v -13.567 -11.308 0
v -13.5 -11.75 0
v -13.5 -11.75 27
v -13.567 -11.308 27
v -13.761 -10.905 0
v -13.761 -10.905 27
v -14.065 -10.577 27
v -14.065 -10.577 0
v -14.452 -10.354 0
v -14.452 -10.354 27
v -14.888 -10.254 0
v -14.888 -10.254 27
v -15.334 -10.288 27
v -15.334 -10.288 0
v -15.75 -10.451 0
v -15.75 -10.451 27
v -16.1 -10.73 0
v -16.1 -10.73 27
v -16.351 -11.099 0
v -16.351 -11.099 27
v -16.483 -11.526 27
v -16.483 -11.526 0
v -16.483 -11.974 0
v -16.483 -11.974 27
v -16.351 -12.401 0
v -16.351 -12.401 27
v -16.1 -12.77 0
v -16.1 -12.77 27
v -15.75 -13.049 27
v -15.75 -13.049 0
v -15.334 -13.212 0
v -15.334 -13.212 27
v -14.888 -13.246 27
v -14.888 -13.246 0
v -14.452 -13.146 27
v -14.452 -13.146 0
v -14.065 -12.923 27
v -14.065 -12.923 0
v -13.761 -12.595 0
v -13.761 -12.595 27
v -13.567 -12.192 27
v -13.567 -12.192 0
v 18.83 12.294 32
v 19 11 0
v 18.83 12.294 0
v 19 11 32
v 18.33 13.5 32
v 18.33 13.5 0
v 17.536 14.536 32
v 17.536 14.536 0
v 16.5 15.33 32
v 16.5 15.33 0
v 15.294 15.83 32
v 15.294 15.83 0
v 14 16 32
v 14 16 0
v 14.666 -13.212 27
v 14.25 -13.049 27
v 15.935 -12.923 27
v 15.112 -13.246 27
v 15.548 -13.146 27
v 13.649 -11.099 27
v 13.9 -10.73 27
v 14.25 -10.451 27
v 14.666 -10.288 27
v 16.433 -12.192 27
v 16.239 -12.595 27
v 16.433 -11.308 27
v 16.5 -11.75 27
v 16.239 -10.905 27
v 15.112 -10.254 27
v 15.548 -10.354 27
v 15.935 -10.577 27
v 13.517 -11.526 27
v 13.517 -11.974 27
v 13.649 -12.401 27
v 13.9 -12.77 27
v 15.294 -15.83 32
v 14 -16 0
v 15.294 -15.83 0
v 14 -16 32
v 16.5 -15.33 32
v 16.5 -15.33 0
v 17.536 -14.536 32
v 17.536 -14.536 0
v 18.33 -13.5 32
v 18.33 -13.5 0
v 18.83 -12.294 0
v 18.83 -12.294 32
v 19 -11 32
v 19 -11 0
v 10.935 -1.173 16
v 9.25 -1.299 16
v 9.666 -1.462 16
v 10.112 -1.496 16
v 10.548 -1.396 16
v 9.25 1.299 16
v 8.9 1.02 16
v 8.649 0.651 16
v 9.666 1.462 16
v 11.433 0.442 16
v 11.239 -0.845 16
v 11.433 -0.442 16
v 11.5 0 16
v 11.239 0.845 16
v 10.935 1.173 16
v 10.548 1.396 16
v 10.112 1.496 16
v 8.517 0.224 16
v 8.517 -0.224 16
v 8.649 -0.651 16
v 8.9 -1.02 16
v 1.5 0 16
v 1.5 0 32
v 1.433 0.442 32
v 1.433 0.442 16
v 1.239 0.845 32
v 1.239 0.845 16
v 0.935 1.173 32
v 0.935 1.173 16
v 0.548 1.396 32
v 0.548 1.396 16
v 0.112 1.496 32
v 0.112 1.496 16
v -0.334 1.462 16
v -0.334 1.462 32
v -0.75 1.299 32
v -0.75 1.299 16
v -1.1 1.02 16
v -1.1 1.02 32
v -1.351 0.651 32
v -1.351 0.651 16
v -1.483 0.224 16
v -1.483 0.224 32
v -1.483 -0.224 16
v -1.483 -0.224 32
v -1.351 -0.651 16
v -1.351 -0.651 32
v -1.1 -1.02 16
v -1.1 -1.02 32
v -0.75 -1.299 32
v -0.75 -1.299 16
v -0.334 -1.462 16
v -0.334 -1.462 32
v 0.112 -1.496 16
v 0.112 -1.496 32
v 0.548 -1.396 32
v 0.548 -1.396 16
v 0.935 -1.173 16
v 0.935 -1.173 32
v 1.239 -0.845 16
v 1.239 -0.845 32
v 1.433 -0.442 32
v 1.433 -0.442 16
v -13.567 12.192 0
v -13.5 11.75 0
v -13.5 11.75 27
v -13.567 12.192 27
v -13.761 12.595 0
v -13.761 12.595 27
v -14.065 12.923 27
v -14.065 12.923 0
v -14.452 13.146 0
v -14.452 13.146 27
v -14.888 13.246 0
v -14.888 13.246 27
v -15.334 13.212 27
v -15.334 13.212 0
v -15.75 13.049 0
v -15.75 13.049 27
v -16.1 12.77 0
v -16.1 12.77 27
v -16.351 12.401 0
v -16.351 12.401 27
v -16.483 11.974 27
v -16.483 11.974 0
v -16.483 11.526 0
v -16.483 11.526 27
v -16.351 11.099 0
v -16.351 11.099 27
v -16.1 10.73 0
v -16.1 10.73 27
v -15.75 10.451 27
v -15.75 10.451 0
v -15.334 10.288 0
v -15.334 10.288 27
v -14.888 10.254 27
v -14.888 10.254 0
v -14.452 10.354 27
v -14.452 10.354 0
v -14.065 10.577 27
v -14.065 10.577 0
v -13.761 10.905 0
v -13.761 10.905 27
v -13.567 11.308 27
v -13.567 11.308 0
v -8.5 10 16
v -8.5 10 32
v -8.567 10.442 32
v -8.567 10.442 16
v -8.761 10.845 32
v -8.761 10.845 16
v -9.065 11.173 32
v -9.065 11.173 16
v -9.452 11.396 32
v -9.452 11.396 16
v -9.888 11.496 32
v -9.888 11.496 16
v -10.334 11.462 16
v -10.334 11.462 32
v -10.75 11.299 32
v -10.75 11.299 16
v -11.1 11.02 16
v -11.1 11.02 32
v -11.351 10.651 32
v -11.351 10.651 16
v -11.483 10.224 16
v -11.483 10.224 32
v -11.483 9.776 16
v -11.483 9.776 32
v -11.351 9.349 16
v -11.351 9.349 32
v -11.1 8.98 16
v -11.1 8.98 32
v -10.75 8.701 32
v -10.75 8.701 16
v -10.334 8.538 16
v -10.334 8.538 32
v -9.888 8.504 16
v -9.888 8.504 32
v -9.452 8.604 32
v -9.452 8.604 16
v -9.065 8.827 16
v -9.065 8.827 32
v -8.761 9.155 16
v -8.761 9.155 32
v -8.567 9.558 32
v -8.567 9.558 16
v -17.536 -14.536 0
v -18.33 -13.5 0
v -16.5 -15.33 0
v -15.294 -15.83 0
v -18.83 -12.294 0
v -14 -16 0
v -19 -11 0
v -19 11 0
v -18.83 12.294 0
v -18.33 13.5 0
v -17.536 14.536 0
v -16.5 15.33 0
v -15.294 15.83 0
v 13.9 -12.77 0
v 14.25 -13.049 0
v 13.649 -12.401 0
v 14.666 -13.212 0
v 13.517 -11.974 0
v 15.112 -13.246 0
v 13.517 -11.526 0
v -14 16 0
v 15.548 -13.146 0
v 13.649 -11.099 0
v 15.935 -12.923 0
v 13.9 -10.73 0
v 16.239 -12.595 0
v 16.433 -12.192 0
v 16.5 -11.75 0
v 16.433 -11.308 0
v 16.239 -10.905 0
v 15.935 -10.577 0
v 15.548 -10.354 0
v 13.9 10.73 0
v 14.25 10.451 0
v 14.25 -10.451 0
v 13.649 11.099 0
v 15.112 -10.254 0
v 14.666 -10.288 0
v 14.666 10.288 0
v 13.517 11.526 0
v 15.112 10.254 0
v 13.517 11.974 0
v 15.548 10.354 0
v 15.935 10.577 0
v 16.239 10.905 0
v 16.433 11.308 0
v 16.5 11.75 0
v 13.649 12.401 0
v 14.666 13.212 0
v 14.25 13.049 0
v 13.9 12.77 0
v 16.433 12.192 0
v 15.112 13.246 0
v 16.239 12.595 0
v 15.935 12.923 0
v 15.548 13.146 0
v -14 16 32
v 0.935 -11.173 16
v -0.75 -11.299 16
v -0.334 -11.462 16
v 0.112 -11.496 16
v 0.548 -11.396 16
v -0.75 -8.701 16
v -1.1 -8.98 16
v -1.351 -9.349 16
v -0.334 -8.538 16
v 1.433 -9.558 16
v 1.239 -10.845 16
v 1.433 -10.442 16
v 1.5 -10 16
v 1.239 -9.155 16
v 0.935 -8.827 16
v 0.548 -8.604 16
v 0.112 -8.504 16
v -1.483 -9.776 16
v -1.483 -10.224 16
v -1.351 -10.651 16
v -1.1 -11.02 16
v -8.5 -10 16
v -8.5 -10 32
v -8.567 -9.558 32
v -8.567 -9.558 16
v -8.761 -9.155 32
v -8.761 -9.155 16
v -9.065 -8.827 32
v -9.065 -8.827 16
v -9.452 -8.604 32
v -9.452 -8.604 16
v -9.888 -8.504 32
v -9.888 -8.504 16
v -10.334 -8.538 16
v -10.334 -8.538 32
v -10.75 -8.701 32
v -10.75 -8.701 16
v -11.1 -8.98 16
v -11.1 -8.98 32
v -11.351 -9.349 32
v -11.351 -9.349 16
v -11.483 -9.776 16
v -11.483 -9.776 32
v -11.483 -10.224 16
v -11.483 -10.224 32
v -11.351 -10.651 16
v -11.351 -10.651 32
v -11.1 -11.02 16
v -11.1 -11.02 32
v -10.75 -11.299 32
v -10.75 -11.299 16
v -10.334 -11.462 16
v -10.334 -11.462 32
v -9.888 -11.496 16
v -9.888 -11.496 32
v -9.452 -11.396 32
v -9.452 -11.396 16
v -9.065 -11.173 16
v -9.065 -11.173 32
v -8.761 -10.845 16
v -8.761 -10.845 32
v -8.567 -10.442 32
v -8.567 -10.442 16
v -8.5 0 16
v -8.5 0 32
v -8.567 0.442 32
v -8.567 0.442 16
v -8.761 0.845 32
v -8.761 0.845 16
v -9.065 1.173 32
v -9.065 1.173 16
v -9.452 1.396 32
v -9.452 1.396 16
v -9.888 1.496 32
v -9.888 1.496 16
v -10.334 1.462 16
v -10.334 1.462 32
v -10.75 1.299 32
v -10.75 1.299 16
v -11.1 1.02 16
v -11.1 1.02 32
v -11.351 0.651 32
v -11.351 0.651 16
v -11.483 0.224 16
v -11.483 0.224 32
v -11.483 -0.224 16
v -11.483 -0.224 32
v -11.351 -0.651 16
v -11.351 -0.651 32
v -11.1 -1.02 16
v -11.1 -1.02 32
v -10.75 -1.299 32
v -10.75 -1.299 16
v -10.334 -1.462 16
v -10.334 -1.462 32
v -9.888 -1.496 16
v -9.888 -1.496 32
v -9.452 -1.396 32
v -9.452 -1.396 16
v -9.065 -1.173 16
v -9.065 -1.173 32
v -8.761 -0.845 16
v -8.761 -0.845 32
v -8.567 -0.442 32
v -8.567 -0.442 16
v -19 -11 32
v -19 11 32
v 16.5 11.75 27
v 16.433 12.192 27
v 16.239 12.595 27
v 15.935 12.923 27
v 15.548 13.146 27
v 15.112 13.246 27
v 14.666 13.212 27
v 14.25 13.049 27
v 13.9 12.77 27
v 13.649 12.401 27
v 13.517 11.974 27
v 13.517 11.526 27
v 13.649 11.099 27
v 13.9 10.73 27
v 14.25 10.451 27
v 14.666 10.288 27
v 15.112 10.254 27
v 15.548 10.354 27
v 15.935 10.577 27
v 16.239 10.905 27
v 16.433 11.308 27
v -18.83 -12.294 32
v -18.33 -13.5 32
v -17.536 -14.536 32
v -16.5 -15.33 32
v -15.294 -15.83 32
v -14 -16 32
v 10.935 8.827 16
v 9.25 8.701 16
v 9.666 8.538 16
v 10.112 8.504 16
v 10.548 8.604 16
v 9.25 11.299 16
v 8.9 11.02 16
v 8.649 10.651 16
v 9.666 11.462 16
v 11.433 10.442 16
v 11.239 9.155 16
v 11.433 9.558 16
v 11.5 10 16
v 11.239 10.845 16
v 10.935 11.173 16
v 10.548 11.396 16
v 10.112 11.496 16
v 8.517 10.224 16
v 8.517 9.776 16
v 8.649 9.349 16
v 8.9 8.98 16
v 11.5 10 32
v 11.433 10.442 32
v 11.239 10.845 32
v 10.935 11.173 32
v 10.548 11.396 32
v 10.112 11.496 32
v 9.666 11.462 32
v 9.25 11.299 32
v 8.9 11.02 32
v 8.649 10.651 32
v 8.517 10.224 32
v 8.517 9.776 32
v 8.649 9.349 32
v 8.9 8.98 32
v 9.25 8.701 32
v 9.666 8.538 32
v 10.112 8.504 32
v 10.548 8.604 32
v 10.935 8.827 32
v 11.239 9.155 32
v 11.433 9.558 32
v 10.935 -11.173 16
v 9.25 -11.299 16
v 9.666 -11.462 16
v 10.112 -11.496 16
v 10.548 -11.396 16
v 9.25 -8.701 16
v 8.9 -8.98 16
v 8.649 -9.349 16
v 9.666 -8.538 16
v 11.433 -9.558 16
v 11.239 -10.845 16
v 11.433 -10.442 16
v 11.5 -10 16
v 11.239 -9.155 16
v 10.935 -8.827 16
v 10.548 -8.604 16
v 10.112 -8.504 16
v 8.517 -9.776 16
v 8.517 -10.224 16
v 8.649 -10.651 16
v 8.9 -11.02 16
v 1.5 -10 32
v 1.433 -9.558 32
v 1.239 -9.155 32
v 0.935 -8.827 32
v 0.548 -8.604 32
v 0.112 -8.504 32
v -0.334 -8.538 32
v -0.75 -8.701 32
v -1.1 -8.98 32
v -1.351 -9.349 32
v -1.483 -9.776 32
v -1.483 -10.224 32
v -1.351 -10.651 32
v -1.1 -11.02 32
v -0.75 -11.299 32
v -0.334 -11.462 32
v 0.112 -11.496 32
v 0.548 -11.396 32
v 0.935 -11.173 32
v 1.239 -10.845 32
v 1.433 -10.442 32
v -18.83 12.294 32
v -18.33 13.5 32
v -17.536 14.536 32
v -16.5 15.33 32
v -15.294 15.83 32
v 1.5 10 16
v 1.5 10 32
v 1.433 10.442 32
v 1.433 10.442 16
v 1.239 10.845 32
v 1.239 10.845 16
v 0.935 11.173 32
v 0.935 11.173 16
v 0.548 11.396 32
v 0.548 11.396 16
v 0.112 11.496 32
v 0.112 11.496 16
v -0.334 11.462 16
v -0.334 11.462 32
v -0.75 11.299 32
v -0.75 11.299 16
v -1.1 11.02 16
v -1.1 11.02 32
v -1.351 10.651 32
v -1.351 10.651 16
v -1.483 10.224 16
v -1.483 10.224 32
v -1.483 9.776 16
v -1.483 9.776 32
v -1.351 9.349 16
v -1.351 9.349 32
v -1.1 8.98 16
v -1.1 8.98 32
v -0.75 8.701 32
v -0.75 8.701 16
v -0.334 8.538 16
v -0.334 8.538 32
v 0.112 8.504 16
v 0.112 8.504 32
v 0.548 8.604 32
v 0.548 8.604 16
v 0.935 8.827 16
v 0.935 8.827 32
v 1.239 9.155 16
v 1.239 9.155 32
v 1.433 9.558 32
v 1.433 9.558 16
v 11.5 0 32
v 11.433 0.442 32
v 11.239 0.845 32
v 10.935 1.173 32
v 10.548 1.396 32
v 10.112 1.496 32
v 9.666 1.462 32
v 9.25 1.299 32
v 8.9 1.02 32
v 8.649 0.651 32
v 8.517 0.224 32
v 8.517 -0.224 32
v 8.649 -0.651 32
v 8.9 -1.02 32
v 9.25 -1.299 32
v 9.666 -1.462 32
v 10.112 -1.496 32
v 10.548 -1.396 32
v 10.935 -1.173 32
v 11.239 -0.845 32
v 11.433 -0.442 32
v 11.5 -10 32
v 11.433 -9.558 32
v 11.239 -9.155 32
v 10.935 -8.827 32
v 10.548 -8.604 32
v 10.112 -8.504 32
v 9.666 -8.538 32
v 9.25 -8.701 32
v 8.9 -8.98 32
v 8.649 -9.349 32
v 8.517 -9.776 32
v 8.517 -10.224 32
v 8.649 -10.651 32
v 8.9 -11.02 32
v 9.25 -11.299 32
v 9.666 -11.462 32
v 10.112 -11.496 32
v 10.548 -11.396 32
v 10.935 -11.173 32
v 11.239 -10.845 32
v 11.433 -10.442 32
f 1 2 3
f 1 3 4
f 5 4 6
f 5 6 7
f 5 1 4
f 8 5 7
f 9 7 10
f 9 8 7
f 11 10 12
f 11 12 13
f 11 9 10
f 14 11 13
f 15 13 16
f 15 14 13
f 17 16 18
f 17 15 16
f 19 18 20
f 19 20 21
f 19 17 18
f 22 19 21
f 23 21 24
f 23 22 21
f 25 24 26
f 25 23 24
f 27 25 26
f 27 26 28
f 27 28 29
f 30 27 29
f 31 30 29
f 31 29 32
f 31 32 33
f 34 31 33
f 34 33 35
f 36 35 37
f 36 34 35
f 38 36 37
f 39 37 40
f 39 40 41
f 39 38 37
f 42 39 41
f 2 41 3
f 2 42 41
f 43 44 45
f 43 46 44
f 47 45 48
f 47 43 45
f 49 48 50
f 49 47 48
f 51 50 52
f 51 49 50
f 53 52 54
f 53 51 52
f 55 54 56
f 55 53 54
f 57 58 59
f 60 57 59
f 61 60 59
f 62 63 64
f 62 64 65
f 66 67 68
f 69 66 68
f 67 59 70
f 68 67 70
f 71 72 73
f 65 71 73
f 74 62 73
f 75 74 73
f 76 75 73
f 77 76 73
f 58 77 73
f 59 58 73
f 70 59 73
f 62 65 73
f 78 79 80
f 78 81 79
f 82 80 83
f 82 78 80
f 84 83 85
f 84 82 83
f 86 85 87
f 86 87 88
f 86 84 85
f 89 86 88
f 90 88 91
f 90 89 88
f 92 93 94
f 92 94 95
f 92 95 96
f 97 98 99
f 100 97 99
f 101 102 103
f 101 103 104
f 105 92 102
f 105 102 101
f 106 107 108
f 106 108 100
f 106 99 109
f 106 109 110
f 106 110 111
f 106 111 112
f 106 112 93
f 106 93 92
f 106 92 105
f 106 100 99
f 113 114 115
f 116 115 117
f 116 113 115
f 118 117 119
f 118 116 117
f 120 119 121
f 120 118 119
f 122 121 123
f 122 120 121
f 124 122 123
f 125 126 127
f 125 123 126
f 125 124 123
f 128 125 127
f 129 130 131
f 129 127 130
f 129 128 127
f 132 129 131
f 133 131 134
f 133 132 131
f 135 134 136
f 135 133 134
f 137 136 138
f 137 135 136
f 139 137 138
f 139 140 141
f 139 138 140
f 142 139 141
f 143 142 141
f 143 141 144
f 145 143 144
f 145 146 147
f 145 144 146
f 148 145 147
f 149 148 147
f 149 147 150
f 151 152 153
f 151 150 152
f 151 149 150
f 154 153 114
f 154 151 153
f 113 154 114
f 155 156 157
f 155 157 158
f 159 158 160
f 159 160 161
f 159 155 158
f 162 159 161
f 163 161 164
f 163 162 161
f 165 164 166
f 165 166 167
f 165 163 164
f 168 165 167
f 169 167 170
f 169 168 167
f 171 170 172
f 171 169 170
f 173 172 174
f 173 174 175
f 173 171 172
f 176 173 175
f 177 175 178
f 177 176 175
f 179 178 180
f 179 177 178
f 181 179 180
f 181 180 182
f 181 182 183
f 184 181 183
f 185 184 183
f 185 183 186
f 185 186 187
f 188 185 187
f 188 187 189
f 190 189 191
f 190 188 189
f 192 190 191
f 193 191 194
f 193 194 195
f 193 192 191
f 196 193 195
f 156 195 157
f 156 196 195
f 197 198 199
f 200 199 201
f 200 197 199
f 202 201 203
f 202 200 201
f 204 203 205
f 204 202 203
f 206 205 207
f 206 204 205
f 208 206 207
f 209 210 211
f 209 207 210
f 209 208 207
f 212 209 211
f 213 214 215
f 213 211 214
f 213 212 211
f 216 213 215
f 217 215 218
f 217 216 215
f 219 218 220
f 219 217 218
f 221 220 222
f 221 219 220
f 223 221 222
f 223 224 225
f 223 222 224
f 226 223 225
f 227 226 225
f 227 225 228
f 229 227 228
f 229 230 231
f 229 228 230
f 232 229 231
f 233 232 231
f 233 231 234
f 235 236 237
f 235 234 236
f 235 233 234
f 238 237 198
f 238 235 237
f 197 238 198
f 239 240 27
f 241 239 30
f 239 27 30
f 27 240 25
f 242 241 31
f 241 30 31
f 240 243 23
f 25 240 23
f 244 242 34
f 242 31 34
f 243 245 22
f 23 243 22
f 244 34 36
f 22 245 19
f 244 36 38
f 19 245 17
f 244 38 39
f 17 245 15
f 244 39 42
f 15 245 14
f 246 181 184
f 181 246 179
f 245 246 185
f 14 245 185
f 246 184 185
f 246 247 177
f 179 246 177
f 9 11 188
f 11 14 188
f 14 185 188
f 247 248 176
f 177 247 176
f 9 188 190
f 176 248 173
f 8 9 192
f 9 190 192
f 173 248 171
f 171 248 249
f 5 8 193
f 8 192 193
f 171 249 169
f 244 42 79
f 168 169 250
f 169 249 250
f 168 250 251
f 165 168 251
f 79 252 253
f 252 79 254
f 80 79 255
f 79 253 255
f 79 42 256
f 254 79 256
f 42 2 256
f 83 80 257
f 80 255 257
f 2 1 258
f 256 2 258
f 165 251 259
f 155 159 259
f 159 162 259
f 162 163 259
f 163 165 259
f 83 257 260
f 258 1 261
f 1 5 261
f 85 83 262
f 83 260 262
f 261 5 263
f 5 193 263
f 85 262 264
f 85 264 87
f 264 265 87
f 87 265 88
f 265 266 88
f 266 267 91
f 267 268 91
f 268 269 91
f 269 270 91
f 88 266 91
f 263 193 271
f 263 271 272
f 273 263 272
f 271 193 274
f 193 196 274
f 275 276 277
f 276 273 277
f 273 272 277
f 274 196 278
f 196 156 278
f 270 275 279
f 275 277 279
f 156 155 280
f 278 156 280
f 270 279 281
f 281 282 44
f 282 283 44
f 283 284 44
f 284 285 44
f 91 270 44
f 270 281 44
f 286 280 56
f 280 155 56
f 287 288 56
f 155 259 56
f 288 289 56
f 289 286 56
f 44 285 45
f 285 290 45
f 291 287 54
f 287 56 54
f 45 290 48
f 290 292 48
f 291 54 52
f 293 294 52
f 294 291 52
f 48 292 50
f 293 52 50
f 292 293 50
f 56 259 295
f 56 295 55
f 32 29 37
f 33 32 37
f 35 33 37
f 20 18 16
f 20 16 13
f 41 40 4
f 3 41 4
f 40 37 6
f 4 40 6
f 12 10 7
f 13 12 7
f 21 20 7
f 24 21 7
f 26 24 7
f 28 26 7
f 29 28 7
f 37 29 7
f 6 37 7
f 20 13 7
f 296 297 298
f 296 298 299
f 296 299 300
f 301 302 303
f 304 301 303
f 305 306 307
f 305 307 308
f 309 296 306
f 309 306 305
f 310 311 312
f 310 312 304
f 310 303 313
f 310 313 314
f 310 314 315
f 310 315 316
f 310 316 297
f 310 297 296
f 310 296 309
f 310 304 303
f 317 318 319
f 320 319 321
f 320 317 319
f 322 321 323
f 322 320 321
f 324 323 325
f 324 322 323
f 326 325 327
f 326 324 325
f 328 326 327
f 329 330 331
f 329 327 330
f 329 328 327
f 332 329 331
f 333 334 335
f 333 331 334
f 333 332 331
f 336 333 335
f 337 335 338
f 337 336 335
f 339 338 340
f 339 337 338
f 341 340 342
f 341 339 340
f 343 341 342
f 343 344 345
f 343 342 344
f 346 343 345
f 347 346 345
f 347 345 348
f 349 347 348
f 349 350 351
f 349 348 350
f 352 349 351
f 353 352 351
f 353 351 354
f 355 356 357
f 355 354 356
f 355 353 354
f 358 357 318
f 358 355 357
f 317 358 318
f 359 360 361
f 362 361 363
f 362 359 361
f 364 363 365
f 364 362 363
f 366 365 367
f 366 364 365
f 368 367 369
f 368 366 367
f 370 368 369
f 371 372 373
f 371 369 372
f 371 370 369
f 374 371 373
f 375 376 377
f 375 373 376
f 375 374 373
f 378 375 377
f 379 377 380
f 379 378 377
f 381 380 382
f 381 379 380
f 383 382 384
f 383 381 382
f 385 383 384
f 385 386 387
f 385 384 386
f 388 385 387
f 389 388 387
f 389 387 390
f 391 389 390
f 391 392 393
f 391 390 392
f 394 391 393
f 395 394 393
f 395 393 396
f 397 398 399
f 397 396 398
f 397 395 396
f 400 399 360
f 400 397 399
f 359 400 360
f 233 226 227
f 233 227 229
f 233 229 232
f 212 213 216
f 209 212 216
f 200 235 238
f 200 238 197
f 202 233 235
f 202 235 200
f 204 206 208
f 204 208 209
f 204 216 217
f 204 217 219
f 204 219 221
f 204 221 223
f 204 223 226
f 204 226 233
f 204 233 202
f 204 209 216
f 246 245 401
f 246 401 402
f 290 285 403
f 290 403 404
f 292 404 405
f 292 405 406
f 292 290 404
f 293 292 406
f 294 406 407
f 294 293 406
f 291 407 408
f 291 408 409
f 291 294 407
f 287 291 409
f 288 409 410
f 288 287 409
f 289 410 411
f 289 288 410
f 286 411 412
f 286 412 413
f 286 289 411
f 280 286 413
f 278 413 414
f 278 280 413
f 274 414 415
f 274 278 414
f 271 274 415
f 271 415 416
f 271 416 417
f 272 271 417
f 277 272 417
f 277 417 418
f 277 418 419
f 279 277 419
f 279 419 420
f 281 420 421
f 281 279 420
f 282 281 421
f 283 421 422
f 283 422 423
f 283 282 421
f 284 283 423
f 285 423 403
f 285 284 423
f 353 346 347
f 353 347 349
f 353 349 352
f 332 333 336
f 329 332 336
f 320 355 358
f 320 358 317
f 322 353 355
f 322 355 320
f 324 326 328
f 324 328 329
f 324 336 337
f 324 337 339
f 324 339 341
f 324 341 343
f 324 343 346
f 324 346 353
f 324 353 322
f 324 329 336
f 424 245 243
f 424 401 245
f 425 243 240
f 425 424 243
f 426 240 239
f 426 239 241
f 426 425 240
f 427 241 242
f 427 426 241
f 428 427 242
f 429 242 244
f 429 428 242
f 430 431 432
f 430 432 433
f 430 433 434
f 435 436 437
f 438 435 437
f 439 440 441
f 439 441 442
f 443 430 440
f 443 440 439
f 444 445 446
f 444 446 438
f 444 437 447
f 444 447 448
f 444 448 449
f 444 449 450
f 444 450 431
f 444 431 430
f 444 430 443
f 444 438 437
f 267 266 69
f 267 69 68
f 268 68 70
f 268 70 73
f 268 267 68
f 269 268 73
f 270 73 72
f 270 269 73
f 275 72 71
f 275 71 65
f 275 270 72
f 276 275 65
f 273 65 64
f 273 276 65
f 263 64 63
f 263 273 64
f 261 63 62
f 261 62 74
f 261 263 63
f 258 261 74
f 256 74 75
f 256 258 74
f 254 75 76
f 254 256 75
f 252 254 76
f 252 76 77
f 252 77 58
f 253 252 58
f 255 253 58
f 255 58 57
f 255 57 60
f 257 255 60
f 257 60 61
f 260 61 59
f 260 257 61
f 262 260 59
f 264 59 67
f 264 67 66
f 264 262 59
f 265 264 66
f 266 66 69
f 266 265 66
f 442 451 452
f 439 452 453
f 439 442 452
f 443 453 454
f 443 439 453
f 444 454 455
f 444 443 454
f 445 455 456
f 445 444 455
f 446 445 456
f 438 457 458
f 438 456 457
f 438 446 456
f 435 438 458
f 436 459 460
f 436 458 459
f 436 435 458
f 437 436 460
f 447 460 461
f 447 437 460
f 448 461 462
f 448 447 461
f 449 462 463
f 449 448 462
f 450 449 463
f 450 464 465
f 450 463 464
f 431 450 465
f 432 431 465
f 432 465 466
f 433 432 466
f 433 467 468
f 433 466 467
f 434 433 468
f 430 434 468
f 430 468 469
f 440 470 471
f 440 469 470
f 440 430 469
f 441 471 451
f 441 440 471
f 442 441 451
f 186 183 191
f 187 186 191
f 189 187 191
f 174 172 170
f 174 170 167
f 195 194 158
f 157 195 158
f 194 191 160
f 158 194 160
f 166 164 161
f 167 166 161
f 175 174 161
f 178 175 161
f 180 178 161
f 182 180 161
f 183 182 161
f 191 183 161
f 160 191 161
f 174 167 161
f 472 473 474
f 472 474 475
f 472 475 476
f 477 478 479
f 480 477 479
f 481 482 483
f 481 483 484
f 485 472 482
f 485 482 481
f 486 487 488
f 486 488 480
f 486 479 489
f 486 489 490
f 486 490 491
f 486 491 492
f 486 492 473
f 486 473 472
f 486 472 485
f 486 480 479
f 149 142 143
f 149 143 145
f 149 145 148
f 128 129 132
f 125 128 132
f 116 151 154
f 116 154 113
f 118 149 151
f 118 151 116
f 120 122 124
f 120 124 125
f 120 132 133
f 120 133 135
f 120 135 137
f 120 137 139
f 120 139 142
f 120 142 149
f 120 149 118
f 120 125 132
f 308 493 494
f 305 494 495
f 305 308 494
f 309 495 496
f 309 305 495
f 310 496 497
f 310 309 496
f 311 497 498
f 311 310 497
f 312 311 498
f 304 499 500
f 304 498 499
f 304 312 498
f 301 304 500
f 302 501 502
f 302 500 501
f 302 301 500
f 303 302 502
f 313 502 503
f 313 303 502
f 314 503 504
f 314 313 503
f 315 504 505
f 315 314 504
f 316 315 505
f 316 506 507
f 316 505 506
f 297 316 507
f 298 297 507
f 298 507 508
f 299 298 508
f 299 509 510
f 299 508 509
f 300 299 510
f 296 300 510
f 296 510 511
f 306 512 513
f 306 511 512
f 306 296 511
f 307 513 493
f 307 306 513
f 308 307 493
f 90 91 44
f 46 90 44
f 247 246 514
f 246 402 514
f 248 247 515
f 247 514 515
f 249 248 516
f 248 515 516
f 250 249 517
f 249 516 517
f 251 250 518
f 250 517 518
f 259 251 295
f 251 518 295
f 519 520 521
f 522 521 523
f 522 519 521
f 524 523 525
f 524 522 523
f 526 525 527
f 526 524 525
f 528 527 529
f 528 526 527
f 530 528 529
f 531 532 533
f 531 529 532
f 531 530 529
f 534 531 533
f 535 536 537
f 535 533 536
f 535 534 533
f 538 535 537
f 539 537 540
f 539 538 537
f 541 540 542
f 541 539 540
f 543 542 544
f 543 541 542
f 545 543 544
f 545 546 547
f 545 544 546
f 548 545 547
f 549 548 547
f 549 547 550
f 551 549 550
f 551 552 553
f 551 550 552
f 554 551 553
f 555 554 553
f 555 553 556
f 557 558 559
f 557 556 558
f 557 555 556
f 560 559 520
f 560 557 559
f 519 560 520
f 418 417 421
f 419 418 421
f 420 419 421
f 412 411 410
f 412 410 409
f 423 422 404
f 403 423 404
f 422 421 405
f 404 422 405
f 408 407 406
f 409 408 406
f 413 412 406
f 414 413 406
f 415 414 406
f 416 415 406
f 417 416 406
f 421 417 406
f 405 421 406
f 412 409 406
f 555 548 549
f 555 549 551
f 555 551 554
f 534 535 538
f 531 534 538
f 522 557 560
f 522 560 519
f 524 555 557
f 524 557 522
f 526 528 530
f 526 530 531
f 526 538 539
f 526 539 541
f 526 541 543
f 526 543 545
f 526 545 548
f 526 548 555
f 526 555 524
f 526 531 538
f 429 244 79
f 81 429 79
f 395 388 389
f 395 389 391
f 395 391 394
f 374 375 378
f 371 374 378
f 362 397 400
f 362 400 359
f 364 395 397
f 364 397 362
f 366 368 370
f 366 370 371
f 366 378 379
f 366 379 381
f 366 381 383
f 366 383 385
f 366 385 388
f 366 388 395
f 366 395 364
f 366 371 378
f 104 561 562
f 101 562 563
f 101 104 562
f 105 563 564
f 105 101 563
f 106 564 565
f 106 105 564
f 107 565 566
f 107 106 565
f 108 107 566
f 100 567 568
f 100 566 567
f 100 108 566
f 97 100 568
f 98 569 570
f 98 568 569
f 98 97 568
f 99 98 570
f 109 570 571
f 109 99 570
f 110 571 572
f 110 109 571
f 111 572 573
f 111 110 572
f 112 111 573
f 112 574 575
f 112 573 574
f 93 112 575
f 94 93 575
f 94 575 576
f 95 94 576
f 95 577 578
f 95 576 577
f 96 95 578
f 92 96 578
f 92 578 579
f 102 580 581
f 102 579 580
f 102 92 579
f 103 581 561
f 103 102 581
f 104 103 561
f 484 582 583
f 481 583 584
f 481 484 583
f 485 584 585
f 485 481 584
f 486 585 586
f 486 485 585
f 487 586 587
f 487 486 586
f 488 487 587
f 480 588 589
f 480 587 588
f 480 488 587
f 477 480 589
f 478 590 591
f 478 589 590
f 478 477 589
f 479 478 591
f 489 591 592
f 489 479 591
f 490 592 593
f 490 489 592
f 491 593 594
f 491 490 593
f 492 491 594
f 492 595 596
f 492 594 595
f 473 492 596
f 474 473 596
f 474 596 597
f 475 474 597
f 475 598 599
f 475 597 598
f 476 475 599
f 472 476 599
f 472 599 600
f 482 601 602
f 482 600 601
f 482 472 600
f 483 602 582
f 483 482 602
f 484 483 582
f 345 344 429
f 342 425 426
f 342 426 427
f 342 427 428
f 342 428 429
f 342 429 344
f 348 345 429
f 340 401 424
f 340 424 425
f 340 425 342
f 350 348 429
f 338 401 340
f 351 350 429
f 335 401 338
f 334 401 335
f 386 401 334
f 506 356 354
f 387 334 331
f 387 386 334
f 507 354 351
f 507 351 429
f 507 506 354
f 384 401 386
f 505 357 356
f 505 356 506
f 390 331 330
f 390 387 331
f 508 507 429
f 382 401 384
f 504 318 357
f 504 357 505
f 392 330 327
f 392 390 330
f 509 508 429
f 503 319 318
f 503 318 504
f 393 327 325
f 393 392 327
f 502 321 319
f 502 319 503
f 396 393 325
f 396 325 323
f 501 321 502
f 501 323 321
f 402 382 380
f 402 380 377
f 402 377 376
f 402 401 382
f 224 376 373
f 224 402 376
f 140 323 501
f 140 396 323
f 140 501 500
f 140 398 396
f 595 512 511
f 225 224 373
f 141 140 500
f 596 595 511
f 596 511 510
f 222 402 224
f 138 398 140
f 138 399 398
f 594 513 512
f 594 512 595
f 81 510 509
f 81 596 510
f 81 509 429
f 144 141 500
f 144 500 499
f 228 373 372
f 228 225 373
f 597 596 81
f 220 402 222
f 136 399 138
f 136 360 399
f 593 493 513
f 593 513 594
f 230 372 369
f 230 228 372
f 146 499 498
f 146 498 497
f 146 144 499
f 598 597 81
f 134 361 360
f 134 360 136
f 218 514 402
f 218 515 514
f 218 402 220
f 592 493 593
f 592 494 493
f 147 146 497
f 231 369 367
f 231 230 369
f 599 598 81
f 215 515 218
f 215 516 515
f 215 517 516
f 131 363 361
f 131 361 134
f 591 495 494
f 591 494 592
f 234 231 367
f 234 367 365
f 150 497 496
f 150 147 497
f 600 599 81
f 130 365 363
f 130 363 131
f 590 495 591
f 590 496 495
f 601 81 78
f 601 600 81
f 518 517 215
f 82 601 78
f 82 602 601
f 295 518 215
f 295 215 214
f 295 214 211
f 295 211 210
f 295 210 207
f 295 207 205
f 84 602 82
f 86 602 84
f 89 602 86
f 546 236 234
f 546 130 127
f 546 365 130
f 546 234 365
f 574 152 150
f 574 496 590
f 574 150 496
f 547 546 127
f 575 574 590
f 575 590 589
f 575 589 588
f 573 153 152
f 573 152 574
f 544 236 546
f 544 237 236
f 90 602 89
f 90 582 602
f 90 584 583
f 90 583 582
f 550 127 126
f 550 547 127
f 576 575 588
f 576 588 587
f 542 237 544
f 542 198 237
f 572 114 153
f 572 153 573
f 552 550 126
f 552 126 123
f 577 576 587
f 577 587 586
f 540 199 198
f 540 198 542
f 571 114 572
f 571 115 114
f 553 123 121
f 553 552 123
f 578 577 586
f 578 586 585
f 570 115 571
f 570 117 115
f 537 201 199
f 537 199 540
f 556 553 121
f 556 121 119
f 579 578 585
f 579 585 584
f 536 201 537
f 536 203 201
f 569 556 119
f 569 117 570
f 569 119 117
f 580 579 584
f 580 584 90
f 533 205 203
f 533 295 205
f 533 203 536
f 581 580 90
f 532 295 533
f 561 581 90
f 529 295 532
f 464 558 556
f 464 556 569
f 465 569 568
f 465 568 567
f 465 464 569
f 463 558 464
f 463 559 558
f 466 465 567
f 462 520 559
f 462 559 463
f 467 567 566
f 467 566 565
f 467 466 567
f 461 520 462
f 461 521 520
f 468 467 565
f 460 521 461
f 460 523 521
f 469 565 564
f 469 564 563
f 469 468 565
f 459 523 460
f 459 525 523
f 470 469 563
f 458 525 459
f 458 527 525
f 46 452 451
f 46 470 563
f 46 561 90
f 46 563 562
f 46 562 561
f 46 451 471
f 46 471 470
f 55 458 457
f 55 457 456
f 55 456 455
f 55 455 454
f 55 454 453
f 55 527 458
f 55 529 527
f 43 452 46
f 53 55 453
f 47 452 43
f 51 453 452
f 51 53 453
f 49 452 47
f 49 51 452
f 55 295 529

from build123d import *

# Parameters (mm, degrees)
CYLINDER011_R     = 1.5
CYLINDER011_DEPTH = 27
ARRAY004_X_COUNT  = 2
ARRAY004_X_PITCH  = 30
ARRAY004_Y_COUNT  = 2
ARRAY004_Y_PITCH  = 23.5
ARRAY003_X_COUNT  = 3
ARRAY003_X_PITCH  = 10
ARRAY003_Y_COUNT  = 3
ARRAY003_Y_PITCH  = 10
BOX008_W          = 38
BOX008_H          = 32
BOX008_DEPTH      = 32
FILLET005_R       = 5


with BuildPart() as coaster_screw_hole:
    # Cylinder011 → Cylinder011 (new body)
    with BuildSketch(Plane.XY):
        Circle(CYLINDER011_R)
    extrude(amount=CYLINDER011_DEPTH)


with BuildPart() as coaster_holder_bottom_hole_array:
    # Array004 base: copy of coaster screw hole
    add(coaster_screw_hole.part)

    # Array004 X: coaster holder bottom hole array ×2


with BuildPart() as coaster_holder_bottom_hole_array_1:
    add(coaster_holder_bottom_hole_array.part)
    with Locations(*[(i * ARRAY004_X_PITCH, 0, 0) for i in range(1, ARRAY004_X_COUNT)]):
        add(coaster_holder_bottom_hole_array.part)

    # Array004 Y: coaster holder bottom hole array ×2


with BuildPart() as coaster_holder_bottom_hole_array_2:
    add(coaster_holder_bottom_hole_array_1.part)
    with Locations(*[(0, i * ARRAY004_Y_PITCH, 0) for i in range(1, ARRAY004_Y_COUNT)]):
        add(coaster_holder_bottom_hole_array_1.part)


with BuildPart() as coaster_holder_bottom_hole_array_3:
    # Array004 placement: moved
    add(coaster_holder_bottom_hole_array_2.part.moved(Location((-15, -11.75, 0))))


with BuildPart() as coaster_hole_fusion:
    # Array003 base: copy of coaster screw hole
    add(coaster_screw_hole.part)

    # Array003 X: coaster hole fusion ×3


with BuildPart() as coaster_hole_fusion_1:
    add(coaster_hole_fusion.part)
    with Locations(*[(i * ARRAY003_X_PITCH, 0, 0) for i in range(1, ARRAY003_X_COUNT)]):
        add(coaster_hole_fusion.part)

    # Array003 Y: coaster hole fusion ×3


with BuildPart() as coaster_hole_fusion_2:
    add(coaster_hole_fusion_1.part)
    with Locations(*[(0, i * ARRAY003_Y_PITCH, 0) for i in range(1, ARRAY003_Y_COUNT)]):
        add(coaster_hole_fusion_1.part)


with BuildPart() as coaster_hole_fusion_3:
    # Array003 placement: moved
    add(coaster_hole_fusion_2.part.moved(Location((-10, -10, 16))))

    # Fusion011: union coaster holder bottom hole array
    add(coaster_holder_bottom_hole_array_3.part)


with BuildPart() as coaster_holder_cut:
    # Box008 → Box008 (new body)
    with BuildSketch(Plane(origin=(-19, -16, 0), x_dir=(1, 0, 0), z_dir=(0, 0, 1))):
        with Locations((19, 16)):
            Rectangle(BOX008_W, BOX008_H)
    extrude(amount=BOX008_DEPTH)

    # Fillet005
    fillet005_edges = [coaster_holder_cut.edges().sort_by_distance(p)[0] for p in [
        (-19, -16, 16),
        (-19, 16, 16),
        (19, -16, 16),
        (19, 16, 16),
    ]]
    fillet(fillet005_edges, radius=FILLET005_R)

    # Cut004004: cut coaster hole fusion
    add(coaster_hole_fusion_3.part, mode=Mode.SUBTRACT)


solid = coaster_holder_cut.part
